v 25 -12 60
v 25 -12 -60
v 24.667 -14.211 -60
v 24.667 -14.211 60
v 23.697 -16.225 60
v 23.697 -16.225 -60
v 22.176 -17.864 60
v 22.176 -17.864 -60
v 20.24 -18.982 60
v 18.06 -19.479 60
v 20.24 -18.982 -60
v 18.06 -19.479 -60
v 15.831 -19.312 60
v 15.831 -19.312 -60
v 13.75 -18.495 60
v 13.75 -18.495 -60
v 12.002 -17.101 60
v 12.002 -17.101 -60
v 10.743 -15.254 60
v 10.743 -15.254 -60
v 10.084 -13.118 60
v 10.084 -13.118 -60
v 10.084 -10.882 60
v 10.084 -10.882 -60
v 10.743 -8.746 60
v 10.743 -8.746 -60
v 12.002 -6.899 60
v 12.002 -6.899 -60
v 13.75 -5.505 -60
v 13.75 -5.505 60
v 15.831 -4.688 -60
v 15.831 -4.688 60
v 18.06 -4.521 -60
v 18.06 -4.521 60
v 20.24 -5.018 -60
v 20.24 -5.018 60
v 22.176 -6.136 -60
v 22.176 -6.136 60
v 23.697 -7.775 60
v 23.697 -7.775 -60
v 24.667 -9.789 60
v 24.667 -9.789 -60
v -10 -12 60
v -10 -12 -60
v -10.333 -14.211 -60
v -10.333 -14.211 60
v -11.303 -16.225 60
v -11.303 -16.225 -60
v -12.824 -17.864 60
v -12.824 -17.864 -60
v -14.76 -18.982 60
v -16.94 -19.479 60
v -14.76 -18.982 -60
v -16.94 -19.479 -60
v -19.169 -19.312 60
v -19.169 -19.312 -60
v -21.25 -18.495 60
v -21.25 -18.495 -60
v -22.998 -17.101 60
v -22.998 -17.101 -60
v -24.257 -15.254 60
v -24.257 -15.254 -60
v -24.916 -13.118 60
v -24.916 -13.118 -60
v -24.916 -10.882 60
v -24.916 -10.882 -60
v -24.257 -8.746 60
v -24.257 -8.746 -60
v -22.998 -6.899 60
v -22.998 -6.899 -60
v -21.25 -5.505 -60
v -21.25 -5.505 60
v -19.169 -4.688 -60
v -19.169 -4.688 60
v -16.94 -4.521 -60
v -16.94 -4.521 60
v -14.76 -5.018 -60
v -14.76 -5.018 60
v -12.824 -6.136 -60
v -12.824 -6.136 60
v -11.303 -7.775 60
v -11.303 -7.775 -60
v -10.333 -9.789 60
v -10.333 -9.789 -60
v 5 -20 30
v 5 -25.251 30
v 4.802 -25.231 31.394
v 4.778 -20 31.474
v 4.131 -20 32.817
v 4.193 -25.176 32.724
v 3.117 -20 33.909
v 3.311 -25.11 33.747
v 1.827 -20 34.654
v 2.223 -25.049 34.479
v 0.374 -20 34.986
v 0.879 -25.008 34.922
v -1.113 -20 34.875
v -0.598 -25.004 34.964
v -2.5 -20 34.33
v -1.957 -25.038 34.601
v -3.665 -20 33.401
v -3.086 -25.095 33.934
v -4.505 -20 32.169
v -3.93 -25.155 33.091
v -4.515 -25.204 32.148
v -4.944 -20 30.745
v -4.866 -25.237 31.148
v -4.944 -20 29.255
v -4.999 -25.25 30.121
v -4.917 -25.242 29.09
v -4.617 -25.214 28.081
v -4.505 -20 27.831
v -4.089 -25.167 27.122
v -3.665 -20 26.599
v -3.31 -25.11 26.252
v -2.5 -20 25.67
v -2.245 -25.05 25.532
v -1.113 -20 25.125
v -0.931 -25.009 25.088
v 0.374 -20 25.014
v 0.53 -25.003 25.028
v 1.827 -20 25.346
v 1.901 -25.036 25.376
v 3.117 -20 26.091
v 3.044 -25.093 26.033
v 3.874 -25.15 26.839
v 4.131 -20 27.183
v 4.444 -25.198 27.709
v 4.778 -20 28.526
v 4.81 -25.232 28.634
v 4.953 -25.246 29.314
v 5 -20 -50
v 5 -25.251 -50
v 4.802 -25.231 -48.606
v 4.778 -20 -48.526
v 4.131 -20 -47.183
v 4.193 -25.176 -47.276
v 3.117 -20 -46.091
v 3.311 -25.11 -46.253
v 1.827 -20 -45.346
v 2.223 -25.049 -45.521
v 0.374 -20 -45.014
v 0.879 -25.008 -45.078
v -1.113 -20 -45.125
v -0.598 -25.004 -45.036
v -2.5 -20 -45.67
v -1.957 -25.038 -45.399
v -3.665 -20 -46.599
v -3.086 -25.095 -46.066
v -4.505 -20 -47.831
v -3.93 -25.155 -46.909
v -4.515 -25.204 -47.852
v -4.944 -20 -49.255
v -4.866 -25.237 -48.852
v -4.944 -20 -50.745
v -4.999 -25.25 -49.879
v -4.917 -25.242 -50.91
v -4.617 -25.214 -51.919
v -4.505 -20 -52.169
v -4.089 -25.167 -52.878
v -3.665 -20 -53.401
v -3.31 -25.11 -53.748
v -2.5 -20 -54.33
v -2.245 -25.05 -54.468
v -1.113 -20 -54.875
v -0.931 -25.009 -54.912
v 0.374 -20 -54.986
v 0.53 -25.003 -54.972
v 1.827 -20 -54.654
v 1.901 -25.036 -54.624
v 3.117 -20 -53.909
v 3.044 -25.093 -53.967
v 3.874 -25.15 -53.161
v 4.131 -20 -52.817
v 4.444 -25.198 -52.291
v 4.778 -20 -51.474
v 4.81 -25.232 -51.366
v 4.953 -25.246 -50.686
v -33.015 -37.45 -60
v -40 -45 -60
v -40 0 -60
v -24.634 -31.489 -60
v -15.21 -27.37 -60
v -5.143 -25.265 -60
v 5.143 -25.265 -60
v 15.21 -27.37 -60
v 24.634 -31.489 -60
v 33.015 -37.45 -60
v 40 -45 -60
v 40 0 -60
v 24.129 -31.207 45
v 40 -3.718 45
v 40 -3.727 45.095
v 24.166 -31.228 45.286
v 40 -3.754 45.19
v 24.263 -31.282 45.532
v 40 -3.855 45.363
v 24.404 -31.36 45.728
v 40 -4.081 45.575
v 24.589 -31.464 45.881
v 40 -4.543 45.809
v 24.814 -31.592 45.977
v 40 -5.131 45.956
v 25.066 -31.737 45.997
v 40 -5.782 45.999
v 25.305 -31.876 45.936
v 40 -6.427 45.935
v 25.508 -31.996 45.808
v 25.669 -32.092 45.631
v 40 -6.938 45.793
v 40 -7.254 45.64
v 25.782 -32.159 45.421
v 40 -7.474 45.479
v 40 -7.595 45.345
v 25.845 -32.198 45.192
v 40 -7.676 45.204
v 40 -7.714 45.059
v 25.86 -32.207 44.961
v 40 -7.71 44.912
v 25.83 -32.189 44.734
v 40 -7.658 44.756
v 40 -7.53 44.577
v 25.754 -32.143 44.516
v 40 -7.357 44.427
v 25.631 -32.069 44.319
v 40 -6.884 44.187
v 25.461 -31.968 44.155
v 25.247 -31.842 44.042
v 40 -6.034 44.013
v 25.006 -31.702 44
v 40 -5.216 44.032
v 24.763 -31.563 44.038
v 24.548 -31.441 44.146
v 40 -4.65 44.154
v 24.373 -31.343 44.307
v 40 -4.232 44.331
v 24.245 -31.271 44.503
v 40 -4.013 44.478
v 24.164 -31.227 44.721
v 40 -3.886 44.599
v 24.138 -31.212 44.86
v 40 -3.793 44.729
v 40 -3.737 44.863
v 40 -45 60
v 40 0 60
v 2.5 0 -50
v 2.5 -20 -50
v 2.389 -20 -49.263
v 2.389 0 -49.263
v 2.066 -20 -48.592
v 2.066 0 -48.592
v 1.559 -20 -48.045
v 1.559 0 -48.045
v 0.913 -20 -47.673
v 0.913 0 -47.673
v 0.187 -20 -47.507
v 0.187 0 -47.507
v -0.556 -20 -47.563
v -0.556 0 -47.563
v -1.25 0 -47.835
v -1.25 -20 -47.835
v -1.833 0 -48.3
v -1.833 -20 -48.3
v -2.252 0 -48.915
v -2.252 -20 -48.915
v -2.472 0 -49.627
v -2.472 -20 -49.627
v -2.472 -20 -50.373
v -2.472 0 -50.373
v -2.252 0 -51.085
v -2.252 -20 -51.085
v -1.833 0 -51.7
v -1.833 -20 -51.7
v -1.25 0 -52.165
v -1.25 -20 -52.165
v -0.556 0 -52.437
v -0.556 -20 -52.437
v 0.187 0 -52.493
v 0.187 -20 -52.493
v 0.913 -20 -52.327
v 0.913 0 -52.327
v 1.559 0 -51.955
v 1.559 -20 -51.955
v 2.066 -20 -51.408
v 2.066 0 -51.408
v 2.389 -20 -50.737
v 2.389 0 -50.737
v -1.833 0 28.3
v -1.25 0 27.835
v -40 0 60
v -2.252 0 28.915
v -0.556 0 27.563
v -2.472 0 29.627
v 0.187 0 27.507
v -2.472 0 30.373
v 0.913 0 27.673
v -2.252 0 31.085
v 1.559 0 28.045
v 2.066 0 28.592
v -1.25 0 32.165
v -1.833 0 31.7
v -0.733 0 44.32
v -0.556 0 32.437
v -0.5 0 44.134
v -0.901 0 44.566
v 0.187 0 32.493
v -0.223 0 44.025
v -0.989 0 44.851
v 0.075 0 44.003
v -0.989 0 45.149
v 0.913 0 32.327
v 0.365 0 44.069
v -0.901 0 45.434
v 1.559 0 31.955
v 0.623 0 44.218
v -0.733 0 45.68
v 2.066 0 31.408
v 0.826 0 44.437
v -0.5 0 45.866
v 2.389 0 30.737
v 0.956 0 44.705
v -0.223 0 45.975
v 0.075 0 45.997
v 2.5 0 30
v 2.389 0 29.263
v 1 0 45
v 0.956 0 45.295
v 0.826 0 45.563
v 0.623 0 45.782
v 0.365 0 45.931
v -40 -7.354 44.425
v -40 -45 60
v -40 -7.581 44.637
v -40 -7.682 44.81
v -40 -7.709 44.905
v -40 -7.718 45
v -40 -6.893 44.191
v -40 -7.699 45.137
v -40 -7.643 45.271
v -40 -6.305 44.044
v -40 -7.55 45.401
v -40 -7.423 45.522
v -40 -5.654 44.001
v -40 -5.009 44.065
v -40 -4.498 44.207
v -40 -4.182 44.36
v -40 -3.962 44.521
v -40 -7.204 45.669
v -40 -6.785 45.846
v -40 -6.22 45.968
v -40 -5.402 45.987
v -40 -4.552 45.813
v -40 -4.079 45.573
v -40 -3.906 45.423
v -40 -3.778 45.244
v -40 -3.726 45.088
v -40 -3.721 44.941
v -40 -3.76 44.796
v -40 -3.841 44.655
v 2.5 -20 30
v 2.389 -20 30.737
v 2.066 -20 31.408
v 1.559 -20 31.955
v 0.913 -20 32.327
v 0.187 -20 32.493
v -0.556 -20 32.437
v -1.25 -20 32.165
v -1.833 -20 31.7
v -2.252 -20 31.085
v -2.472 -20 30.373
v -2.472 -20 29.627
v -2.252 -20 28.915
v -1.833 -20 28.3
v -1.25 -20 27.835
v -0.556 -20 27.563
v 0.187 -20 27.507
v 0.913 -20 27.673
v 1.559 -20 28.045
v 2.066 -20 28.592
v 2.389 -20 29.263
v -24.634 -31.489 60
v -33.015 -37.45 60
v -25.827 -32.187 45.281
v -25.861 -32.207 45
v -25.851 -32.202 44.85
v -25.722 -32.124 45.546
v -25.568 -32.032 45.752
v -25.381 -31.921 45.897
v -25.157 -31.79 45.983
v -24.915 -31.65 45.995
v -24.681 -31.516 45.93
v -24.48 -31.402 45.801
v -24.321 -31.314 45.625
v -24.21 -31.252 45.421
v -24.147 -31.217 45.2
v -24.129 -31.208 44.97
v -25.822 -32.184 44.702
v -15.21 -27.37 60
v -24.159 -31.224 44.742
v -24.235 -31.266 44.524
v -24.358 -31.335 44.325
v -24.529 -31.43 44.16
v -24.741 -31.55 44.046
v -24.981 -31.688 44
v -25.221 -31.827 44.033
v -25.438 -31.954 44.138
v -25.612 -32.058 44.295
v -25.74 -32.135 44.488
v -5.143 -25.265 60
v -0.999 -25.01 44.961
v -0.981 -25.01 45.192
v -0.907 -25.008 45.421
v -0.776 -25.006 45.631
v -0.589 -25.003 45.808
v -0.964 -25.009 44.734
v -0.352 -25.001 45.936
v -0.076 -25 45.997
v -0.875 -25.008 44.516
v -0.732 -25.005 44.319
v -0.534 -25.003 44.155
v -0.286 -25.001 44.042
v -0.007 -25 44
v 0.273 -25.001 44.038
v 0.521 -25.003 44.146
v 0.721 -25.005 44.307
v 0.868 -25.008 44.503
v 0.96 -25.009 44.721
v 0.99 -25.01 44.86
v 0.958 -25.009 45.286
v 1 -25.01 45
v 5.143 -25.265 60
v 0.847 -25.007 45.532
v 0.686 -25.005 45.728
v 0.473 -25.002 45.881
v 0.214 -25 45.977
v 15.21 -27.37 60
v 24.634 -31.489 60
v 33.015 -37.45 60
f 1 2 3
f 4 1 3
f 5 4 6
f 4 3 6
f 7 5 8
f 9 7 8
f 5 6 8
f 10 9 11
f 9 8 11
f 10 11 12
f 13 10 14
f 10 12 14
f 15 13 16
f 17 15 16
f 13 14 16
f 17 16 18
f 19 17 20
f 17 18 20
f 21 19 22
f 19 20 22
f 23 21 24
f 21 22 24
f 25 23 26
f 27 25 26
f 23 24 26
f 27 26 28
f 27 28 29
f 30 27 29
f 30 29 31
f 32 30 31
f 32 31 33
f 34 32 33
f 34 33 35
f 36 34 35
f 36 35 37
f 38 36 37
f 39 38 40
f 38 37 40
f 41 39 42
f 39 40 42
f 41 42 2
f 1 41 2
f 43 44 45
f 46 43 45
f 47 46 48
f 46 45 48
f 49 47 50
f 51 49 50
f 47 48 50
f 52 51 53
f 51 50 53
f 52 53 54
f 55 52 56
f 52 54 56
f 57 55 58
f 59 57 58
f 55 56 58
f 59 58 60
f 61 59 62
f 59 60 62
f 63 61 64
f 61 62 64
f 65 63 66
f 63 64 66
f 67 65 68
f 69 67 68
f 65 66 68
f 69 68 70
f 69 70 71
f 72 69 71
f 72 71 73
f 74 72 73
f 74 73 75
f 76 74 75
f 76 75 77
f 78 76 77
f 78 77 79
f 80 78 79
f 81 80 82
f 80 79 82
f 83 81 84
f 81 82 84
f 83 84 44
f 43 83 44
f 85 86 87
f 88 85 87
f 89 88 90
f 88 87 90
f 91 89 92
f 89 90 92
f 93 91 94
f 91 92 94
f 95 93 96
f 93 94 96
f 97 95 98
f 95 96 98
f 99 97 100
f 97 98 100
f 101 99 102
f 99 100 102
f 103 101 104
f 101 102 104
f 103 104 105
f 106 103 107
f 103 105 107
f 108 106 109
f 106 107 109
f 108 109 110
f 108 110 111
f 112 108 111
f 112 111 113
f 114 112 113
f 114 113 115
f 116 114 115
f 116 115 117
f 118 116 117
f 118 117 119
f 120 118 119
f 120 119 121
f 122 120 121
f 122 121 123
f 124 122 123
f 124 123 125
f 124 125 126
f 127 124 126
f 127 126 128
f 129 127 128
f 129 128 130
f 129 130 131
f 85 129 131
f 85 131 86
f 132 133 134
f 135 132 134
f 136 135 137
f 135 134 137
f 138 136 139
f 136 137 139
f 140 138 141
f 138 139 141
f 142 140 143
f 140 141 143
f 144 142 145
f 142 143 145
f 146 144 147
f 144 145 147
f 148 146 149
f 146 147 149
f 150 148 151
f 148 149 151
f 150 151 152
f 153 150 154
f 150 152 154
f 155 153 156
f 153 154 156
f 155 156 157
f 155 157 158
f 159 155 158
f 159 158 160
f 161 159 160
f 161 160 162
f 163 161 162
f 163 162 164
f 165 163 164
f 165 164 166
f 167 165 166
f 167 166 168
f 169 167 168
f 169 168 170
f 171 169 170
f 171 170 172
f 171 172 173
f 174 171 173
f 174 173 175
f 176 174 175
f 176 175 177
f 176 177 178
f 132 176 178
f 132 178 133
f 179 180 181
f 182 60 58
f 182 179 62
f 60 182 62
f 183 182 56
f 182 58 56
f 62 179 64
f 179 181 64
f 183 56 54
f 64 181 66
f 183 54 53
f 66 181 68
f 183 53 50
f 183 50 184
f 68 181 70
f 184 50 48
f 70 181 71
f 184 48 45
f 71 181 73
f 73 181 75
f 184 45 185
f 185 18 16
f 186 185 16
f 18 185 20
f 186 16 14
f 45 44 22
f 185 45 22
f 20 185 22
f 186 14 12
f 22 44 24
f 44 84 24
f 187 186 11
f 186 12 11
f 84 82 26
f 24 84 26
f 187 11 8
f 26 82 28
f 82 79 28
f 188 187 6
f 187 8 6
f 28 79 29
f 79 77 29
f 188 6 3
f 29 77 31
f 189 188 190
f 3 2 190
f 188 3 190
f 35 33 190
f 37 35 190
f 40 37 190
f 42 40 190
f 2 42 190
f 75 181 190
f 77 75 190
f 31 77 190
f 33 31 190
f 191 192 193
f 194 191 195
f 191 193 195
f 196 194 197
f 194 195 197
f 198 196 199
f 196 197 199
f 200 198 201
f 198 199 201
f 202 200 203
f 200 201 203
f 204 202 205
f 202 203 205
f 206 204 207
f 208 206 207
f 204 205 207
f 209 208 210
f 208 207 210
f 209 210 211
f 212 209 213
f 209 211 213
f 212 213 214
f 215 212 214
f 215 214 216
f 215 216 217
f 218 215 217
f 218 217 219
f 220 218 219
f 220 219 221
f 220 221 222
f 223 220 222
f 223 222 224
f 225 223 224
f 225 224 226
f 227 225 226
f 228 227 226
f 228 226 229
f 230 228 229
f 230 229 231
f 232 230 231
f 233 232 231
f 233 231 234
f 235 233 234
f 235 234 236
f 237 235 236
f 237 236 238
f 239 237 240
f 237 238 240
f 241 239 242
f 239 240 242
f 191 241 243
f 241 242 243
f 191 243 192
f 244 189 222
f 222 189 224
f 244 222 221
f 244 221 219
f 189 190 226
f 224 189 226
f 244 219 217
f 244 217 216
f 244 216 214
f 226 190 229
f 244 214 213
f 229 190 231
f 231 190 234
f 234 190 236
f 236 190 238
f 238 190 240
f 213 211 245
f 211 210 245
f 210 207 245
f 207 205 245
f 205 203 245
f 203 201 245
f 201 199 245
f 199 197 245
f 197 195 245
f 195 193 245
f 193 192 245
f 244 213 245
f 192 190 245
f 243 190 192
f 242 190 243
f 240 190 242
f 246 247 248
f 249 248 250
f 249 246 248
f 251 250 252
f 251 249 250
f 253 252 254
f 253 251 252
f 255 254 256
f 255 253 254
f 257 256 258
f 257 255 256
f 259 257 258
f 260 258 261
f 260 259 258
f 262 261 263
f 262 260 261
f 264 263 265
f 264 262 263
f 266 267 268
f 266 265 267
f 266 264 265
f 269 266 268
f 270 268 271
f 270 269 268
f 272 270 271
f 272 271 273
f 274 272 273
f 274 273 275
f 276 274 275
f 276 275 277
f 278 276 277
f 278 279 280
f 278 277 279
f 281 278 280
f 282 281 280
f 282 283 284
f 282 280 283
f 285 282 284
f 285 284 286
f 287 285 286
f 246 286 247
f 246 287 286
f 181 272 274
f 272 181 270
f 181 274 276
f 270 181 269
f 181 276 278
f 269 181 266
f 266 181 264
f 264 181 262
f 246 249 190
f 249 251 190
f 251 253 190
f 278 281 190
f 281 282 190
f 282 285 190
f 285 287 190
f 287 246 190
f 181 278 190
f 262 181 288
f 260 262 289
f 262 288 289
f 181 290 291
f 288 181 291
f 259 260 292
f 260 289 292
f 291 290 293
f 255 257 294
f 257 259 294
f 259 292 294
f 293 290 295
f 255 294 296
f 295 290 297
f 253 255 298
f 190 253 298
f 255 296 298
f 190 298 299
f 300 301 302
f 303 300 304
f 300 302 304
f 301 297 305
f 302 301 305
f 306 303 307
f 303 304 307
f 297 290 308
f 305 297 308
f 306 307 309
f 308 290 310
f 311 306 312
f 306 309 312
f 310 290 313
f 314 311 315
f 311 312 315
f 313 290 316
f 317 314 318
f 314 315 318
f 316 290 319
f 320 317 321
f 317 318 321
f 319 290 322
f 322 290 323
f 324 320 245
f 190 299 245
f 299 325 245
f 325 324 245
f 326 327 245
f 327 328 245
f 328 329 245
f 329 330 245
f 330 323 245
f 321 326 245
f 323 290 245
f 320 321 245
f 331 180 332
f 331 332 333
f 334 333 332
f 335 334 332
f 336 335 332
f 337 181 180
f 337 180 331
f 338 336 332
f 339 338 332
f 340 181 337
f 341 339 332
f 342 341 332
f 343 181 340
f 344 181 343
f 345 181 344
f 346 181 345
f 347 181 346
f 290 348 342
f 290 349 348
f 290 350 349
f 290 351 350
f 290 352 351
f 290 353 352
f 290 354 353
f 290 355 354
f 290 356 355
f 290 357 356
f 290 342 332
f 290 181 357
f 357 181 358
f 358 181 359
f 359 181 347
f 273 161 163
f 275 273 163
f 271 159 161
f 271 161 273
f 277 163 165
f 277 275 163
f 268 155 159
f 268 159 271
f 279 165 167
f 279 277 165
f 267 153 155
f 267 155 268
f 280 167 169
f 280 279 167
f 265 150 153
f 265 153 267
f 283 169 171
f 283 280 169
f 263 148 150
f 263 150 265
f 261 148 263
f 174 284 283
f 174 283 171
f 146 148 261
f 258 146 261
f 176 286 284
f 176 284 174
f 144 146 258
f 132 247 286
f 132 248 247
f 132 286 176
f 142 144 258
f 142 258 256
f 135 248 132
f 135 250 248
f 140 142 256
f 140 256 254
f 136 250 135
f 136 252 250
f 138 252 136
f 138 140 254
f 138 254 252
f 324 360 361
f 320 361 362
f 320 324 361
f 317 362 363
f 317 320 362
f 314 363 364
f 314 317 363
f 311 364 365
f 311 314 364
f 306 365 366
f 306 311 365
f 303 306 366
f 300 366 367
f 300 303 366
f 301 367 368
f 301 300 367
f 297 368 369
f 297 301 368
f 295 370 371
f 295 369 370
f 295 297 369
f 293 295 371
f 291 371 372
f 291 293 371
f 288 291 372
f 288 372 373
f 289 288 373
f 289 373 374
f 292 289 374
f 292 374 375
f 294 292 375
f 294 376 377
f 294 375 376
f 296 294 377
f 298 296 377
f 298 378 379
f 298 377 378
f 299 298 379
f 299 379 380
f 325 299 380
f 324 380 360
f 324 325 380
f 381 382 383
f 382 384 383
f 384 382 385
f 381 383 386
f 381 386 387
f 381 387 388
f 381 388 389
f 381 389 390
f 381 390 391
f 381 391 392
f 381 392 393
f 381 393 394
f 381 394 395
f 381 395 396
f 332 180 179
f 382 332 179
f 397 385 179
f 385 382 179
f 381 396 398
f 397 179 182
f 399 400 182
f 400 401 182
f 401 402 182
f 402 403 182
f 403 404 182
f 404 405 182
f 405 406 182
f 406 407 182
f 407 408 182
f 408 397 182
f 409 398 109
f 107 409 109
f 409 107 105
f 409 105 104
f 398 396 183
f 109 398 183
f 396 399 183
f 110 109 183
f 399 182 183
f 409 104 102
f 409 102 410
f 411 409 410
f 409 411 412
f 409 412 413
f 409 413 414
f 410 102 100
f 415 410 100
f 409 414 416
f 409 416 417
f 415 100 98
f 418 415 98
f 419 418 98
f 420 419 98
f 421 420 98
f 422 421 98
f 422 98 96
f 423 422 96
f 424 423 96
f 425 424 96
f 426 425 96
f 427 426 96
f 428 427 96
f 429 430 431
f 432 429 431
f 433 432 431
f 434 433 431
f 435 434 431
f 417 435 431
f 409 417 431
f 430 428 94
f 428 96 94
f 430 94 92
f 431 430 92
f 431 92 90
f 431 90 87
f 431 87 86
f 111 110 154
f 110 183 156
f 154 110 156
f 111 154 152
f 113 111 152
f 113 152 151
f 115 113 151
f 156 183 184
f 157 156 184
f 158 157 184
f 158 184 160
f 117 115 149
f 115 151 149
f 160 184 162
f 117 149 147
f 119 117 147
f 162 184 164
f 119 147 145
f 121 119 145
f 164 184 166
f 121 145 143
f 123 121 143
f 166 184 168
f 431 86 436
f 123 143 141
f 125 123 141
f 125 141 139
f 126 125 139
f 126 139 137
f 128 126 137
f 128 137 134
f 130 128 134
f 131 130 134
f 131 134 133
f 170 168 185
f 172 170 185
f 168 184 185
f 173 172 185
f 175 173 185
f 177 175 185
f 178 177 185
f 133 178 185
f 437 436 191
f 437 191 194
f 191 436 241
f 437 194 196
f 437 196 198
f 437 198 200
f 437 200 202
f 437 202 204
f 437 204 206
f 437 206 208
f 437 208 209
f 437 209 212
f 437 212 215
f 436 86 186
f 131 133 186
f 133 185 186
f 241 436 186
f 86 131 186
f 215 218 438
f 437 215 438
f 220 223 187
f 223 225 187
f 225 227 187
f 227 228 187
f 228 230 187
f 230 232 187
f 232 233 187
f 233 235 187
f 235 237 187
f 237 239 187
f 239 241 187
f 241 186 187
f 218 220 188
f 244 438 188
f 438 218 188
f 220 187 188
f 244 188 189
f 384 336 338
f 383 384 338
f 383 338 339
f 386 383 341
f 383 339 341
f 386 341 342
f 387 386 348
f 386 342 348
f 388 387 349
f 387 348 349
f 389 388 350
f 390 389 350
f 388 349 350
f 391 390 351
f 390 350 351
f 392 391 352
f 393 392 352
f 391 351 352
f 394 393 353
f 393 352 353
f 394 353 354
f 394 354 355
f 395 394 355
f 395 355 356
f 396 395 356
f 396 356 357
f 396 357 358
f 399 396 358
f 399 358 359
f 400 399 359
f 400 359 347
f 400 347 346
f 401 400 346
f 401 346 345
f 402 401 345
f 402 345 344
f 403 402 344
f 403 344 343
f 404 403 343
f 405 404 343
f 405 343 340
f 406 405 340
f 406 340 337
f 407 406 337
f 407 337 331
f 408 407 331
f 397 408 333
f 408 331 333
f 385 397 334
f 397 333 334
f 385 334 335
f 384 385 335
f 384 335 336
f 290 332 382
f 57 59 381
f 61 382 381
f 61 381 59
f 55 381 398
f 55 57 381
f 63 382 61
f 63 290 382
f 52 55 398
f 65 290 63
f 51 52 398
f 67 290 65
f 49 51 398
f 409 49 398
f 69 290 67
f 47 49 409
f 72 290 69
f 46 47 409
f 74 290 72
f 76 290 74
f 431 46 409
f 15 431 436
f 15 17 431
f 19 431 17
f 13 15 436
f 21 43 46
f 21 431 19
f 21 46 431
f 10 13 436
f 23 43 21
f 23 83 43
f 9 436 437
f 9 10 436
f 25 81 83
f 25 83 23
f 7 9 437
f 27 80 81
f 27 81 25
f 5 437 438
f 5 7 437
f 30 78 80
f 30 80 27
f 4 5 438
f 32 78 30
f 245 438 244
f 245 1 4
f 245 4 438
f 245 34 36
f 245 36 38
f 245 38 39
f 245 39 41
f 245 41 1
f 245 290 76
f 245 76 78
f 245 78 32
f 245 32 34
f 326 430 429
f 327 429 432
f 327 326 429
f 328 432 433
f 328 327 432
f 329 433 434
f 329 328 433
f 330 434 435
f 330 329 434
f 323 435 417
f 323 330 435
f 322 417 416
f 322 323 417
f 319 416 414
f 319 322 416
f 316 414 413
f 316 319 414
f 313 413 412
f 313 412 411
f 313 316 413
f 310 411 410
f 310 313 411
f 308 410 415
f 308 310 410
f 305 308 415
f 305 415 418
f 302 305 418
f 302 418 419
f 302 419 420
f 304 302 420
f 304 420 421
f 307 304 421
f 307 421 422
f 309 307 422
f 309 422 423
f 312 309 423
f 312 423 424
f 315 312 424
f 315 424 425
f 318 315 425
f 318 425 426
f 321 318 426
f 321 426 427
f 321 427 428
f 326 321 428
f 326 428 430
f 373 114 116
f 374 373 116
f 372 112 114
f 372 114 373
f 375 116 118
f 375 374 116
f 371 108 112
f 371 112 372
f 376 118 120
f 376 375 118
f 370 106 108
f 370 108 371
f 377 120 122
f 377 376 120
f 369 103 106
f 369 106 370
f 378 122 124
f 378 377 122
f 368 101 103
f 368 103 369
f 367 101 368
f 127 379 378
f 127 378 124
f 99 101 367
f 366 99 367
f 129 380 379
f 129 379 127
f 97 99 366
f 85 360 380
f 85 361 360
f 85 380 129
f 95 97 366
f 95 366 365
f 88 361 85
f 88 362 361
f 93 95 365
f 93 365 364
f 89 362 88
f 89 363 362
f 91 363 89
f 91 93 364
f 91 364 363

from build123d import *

# Parameters (mm, degrees)
F0_W      = 80
F0_H      = 120
F0_R      = 2.5
F0_R_2    = 1
F1_DEPTH  = 50
F3_DEPTH  = 120.001
F5_R      = 5
F6_DEPTH  = 10
F7_R      = 7.5
F8_DEPTH  = 120
F13_R     = 1
F15_DEPTH = 94.020238
F14_R     = 1
F16_DEPTH = 94.020238


with BuildPart() as f1:
    # F0 (on Front) → F1 (new body)
    with BuildSketch(Plane.XZ):
        Rectangle(F0_W, F0_H)
        with Locations((0, -50)):
            Circle(F0_R, mode=Mode.SUBTRACT)
        with Locations((0, 30)):
            Circle(F0_R, mode=Mode.SUBTRACT)
        with Locations((0, 45)):
            Circle(F0_R_2, mode=Mode.SUBTRACT)
    extrude(amount=F1_DEPTH)

    # F2 (on face) → F3 (cut, through all)
    with BuildSketch(Plane(origin=(0, 0, -60), x_dir=(1, 0, 0), z_dir=(0, 0, -1))):
        with BuildLine():
            Line((43.30127, 50), (-43.30127, 50))
            ThreePointArc((-43.30127, 50), (0, 25), (43.30127, 50))
        make_face()
    extrude(amount=-F3_DEPTH, mode=Mode.SUBTRACT)

    # F5 (on offset) → F6 (cut)
    with BuildSketch(Plane.XZ.offset(30)):
        with Locations((0, -50)):
            Circle(F5_R)
        with Locations((0, 30)):
            Circle(F5_R)
    extrude(amount=-F6_DEPTH, mode=Mode.SUBTRACT)

    # F7 (on face) → F8 (cut, through all)
    with BuildSketch(Plane(origin=(0, 0, -60), x_dir=(1, 0, 0), z_dir=(0, 0, -1))):
        with Locations((-17.5, 12)):
            Circle(F7_R)
        with Locations((17.5, 12)):
            Circle(F7_R)
    extrude(amount=-F8_DEPTH, mode=Mode.SUBTRACT)

    # F13 (on face) → F15 (cut, through all)
    with BuildSketch(Plane(origin=(17.524047, 30.35254, 0), x_dir=(-0.866025, 0.5, 0), z_dir=(0.5, 0.866025, 0))):
        with Locations((-37.5, 45)):
            Circle(F13_R)
    extrude(amount=-F15_DEPTH, mode=Mode.SUBTRACT)

    # F14 (on face) → F16 (cut, through all)
    with BuildSketch(Plane(origin=(-17.524047, 30.35254, 0), x_dir=(-0.866025, -0.5, 0), z_dir=(-0.5, 0.866025, 0))):
        with Locations((37.5, 45)):
            Circle(F14_R)
    extrude(amount=-F16_DEPTH, mode=Mode.SUBTRACT)


solid = f1.part
